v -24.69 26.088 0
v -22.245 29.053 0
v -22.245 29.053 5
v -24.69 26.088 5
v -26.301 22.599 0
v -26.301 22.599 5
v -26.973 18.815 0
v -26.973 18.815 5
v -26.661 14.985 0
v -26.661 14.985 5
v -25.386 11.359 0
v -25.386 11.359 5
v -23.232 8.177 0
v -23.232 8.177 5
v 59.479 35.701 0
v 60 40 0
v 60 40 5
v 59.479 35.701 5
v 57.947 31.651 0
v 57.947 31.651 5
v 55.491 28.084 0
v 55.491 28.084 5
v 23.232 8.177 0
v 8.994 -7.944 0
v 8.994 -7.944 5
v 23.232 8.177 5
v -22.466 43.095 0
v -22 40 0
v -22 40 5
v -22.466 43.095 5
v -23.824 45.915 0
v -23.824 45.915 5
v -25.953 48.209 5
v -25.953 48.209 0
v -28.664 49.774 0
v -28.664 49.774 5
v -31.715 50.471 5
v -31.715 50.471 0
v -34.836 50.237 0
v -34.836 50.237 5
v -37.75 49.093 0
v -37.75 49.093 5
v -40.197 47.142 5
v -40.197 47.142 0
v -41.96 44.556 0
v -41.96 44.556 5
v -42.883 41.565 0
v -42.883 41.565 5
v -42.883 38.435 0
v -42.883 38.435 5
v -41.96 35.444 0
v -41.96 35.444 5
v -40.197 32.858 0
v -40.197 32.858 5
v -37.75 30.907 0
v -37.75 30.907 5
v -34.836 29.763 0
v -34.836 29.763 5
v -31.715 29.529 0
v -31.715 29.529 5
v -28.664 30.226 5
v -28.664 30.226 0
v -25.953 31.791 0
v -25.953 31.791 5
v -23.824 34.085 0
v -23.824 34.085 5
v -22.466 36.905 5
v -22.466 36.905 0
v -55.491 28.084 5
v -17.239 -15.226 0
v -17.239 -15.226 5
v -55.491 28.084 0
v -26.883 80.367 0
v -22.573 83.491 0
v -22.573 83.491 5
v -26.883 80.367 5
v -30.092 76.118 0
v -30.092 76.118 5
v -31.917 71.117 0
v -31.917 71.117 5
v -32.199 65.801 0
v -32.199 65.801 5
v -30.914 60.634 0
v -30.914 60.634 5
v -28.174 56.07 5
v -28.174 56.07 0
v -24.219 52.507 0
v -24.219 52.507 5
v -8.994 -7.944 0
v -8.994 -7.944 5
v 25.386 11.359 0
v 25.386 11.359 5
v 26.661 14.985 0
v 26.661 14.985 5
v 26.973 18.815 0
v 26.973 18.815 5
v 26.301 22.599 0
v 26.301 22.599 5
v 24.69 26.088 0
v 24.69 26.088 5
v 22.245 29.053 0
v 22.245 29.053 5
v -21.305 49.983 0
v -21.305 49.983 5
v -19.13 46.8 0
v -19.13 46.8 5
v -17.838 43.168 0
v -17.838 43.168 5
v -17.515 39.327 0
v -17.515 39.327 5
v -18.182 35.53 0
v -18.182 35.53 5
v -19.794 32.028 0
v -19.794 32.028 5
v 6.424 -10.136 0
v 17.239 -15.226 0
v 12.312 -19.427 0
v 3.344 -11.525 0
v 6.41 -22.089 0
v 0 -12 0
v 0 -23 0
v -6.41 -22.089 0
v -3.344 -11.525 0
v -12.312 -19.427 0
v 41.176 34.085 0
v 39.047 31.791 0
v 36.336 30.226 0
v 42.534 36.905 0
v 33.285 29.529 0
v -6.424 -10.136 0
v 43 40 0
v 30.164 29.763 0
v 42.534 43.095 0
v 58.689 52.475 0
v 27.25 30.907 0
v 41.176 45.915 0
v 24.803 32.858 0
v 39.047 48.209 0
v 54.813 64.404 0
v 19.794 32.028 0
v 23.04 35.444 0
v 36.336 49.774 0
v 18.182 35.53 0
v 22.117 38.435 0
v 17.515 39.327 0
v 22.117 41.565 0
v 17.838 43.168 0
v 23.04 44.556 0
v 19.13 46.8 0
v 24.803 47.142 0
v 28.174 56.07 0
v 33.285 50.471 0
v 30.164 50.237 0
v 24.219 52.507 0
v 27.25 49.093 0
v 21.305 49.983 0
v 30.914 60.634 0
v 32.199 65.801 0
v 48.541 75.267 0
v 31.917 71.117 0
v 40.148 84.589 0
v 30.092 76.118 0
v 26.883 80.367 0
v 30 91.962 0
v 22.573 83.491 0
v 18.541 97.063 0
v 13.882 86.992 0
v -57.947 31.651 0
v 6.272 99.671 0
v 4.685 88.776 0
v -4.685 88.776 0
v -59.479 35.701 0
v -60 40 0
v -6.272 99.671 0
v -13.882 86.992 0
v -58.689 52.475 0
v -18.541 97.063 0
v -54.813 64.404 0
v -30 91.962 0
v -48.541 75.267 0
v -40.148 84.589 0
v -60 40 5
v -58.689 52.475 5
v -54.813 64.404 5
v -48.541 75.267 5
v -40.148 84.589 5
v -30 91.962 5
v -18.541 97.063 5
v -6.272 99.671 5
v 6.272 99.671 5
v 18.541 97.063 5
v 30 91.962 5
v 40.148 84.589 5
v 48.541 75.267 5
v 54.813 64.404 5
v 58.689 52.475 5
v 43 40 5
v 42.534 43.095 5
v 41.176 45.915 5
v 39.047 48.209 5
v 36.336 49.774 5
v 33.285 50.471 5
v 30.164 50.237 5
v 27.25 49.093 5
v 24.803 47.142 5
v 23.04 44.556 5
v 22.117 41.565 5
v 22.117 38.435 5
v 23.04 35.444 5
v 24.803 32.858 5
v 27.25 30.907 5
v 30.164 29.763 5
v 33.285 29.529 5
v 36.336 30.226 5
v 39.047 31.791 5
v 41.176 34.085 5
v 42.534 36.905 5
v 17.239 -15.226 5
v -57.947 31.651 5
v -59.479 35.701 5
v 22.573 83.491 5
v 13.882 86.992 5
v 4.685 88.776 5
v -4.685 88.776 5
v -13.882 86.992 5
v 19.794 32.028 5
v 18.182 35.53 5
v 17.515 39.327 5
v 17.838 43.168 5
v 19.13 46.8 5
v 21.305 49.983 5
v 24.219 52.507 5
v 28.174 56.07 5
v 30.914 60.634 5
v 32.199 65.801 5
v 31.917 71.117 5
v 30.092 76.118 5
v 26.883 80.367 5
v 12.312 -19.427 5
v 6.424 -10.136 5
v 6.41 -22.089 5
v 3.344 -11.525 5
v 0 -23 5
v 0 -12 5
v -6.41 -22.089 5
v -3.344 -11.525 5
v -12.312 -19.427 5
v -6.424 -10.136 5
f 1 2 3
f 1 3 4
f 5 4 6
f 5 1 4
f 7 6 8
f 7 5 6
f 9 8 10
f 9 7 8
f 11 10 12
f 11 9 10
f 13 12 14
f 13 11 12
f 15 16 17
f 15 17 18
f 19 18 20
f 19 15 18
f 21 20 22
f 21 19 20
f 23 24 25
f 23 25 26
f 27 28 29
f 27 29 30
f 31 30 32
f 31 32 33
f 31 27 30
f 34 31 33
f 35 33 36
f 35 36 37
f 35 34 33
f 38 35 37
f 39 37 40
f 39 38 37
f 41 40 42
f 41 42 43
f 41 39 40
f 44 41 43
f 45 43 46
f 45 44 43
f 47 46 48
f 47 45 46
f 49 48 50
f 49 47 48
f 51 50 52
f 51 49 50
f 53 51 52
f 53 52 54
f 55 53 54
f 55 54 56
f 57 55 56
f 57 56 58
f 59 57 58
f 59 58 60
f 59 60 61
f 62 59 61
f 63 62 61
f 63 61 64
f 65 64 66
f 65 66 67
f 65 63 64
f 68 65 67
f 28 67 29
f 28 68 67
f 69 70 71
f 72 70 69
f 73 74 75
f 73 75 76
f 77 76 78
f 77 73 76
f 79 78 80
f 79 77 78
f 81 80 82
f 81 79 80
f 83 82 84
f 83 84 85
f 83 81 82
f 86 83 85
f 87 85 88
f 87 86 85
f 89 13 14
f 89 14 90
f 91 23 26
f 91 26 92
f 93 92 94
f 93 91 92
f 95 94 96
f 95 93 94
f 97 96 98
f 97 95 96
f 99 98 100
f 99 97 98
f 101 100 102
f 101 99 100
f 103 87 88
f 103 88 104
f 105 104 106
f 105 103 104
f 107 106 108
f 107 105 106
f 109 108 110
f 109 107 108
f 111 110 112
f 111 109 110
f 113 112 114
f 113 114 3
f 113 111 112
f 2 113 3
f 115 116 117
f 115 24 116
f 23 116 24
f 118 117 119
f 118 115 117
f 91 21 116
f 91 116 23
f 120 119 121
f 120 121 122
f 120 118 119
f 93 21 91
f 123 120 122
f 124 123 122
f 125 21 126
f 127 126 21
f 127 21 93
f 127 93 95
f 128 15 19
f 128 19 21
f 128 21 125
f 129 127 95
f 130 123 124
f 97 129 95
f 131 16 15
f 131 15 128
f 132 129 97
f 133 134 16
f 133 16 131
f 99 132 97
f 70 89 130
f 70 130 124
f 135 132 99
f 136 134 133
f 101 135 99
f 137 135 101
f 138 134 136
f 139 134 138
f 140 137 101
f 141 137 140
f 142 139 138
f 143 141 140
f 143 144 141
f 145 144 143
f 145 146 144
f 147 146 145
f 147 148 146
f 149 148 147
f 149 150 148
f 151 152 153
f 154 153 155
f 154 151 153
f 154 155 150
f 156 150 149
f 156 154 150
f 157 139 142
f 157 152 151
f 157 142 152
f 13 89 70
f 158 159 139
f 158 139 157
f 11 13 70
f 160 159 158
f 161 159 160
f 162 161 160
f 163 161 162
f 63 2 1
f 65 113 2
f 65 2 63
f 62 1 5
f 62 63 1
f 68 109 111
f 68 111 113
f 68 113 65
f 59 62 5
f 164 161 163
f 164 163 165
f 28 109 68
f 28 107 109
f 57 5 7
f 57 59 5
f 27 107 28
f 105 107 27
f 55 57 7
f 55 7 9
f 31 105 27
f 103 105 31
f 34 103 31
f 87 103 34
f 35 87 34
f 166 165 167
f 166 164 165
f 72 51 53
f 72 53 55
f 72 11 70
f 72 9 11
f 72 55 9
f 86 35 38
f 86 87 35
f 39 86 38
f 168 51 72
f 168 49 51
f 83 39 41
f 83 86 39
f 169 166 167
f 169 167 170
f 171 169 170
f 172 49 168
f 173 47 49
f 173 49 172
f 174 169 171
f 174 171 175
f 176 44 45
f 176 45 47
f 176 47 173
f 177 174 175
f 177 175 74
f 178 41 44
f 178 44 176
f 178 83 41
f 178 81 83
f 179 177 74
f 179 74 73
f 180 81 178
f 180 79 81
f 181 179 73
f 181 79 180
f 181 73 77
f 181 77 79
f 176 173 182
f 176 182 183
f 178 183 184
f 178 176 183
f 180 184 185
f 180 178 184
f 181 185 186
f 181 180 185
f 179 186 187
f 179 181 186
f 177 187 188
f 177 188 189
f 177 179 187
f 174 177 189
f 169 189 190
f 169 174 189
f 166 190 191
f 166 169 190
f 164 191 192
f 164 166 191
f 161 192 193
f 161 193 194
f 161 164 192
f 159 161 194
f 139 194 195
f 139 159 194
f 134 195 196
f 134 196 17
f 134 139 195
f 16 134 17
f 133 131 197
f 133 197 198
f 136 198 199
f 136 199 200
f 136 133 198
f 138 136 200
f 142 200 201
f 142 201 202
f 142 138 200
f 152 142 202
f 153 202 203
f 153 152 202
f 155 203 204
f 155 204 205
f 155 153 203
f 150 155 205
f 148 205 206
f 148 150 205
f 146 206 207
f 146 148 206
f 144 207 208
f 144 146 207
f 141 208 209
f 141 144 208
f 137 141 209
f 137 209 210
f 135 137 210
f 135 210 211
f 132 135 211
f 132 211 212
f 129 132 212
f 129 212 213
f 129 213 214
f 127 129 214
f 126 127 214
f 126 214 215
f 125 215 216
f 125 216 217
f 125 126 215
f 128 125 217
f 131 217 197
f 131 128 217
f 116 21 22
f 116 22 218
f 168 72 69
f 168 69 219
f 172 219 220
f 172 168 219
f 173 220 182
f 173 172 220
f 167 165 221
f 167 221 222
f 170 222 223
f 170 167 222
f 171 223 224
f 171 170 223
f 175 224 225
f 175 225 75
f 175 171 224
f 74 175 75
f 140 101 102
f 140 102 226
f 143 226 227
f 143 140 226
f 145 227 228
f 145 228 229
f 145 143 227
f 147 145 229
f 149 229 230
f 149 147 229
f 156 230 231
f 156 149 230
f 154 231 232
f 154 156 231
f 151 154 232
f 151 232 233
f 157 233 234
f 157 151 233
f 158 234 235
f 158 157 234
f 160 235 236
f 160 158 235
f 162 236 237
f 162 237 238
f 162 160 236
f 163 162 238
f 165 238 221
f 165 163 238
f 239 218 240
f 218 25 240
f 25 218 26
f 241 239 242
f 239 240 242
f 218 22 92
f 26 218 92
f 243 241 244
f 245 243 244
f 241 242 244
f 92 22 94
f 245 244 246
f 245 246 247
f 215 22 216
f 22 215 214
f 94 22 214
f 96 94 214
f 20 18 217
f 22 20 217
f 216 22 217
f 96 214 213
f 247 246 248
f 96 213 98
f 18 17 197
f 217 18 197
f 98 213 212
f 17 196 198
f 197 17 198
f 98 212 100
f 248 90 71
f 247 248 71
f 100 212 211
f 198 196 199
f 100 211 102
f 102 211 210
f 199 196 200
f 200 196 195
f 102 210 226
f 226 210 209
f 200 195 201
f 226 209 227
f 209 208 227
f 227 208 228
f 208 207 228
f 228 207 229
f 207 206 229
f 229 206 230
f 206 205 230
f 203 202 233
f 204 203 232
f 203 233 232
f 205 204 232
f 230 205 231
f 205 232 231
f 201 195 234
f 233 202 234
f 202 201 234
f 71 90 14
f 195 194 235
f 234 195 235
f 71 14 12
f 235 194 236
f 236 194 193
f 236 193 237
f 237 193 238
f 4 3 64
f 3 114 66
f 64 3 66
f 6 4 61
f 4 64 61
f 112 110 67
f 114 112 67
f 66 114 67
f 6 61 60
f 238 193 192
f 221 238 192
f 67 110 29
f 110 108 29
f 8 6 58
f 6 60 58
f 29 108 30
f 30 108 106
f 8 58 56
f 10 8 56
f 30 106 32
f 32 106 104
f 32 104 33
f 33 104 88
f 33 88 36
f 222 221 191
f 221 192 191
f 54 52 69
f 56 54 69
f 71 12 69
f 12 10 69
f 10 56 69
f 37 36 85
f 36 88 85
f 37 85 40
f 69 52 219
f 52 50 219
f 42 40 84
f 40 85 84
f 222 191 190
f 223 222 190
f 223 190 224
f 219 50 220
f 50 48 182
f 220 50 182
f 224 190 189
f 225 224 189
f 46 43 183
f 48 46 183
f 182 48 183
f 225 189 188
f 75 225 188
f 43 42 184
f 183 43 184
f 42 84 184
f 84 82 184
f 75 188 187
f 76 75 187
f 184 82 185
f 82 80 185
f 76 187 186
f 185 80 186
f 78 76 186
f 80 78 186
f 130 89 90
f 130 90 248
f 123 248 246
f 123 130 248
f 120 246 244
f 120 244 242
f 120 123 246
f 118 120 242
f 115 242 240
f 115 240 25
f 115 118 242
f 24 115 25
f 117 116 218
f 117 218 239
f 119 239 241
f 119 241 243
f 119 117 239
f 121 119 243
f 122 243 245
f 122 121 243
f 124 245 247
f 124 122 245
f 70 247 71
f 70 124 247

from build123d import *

# Parameters (mm, degrees)
SZKIC1_R                    = 10.5
DODANIE_WYCI_GNI_CIE1_DEPTH = 5


with BuildPart() as part:
    # Szkic1 → Dodanie-wyciągnięcie1 (new body)
    with BuildSketch(Plane.XY):
        with BuildLine():
            Line((-17.23880927, -15.225749734), (-55.491242037, 28.084195861))
            ThreePointArc((-55.491242037, 28.084195861), (-58.835117414, 33.629849165), (-60, 40))
            ThreePointArc((-60, 40), (0, 100), (60, 40))
            ThreePointArc((60, 40), (58.835117414, 33.629849165), (55.491242037, 28.084195861))
            Line((55.491242037, 28.084195861), (17.23880927, -15.225749734))
            ThreePointArc((17.23880927, -15.225749734), (0, -23), (-17.23880927, -15.225749734))
        make_face()
        with Locations((-32.5, 40)):
            Circle(SZKIC1_R, mode=Mode.SUBTRACT)
        with Locations((32.5, 40)):
            Circle(SZKIC1_R, mode=Mode.SUBTRACT)
        with BuildLine():
            Line((-23.232277997, 8.17672768), (-8.994161358, -7.943869426))
            ThreePointArc((-8.994161358, -7.943869426), (0, -12), (8.994161358, -7.943869426))
            Line((8.994161358, -7.943869426), (23.232277997, 8.17672768))
            ThreePointArc((23.232277997, 8.17672768), (26.972823751, 18.81529275), (22.24478815, 29.053282232))
            ThreePointArc((22.24478815, 29.053282232), (17.552836173, 41.257892492), (24.218531469, 52.506689369))
            ThreePointArc((24.218531469, 52.506689369), (32.255432897, 68.469423949), (22.572828784, 83.491003675))
            ThreePointArc((22.572828784, 83.491003675), (0, 89), (-22.572828784, 83.491003675))
            ThreePointArc((-22.572828784, 83.491003675), (-32.255432897, 68.469423949), (-24.218531469, 52.506689369))
            ThreePointArc((-24.218531469, 52.506689369), (-17.552836173, 41.257892492), (-22.24478815, 29.053282232))
            ThreePointArc((-22.24478815, 29.053282232), (-26.972823751, 18.81529275), (-23.232277997, 8.17672768))
        make_face(mode=Mode.SUBTRACT)
    extrude(amount=DODANIE_WYCI_GNI_CIE1_DEPTH)


solid = part.part
